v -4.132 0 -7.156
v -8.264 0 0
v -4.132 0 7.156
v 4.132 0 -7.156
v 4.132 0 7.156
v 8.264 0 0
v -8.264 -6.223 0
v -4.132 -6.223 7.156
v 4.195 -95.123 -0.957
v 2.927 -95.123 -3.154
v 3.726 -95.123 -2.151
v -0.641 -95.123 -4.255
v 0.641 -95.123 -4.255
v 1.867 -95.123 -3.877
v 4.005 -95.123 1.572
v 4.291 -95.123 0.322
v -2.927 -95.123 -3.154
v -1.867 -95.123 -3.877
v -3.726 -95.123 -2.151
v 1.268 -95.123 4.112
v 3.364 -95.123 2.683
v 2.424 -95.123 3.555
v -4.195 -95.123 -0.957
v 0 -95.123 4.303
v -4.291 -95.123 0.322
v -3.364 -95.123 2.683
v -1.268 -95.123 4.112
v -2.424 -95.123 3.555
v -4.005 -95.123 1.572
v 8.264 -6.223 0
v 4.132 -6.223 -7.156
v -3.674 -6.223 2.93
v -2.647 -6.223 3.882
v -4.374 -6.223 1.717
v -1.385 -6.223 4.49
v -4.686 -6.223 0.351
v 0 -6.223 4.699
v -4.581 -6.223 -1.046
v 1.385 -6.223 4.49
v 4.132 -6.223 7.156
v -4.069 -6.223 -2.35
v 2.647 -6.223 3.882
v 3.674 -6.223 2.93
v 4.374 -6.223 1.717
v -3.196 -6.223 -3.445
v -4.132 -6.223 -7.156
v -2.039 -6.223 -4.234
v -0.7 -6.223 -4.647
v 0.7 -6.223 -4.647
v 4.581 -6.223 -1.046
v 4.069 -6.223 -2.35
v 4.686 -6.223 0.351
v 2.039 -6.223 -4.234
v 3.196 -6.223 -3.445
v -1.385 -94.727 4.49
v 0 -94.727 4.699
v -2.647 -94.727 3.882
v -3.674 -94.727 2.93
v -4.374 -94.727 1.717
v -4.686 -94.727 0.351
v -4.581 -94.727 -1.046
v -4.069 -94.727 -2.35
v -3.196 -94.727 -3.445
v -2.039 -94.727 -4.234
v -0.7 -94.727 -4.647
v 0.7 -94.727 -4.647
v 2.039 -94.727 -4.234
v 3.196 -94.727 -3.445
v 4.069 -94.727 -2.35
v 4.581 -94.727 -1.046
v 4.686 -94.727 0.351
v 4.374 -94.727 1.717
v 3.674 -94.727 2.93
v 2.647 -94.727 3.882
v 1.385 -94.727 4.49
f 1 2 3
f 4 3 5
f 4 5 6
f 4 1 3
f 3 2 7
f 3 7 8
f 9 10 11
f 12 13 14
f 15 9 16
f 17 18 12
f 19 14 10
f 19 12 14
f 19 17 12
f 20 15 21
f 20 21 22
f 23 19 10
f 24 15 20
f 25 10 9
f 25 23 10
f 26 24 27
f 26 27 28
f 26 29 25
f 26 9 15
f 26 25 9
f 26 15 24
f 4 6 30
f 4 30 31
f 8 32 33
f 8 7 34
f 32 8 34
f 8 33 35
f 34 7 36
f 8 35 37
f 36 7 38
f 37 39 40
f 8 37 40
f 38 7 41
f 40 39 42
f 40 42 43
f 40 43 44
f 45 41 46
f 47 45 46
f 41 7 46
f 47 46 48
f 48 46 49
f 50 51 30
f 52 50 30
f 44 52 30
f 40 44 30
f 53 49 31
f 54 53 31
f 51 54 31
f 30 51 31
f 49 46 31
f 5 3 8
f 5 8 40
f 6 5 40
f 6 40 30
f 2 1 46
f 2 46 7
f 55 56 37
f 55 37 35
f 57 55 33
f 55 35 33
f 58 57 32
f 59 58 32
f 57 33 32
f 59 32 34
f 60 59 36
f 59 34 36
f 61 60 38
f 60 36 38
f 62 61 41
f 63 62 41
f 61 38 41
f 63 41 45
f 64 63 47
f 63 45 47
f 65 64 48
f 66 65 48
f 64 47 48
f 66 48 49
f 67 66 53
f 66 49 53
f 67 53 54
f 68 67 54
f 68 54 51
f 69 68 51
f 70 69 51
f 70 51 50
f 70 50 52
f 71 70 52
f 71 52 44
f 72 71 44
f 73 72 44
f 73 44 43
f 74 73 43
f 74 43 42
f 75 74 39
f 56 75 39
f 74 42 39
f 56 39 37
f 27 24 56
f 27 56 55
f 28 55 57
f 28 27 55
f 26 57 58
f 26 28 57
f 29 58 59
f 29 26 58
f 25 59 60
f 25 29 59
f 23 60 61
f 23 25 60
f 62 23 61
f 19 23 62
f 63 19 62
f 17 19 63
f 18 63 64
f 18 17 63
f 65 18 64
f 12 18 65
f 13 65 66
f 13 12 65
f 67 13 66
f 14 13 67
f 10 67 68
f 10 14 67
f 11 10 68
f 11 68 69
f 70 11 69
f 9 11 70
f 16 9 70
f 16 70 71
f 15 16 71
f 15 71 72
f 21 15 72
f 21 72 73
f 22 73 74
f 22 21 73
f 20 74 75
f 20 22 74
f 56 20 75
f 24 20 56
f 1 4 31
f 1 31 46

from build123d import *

# Parameters (mm, degrees)
EXTRUDE1_DEPTH = 6.223
SKETCH2_R      = 4.699
EXTRUDE2_DEPTH = 88.9
CHAMFER1_SIZE  = 0.3962


with BuildPart() as part:
    # Sketch1 → Extrude1 (new body)
    with BuildSketch(Plane(origin=(0, 0, 0), x_dir=(1, 0, 0), z_dir=(0, 1, 0))):
        Polygon((8.263556668, 0), (4.131778334, 7.15645), (-4.131778334, 7.15645), (-8.263556668, 0), (-4.131778334, -7.15645), (4.131778334, -7.15645), align=None)
    extrude(amount=-EXTRUDE1_DEPTH)

    # Sketch2 → Extrude2 (add)
    with BuildSketch(Plane.XZ.offset(6.223)):
        with Locations(Location((0, 0, 0), (0, 0, 90))):
            Circle(SKETCH2_R)
    extrude(amount=EXTRUDE2_DEPTH)

    # Chamfer1
    chamfer1_edges = [part.edges().sort_by_distance(p)[0] for p in [
        (0, -95.123, -4.699),
    ]]
    chamfer(chamfer1_edges, length=CHAMFER1_SIZE)


solid = part.part
